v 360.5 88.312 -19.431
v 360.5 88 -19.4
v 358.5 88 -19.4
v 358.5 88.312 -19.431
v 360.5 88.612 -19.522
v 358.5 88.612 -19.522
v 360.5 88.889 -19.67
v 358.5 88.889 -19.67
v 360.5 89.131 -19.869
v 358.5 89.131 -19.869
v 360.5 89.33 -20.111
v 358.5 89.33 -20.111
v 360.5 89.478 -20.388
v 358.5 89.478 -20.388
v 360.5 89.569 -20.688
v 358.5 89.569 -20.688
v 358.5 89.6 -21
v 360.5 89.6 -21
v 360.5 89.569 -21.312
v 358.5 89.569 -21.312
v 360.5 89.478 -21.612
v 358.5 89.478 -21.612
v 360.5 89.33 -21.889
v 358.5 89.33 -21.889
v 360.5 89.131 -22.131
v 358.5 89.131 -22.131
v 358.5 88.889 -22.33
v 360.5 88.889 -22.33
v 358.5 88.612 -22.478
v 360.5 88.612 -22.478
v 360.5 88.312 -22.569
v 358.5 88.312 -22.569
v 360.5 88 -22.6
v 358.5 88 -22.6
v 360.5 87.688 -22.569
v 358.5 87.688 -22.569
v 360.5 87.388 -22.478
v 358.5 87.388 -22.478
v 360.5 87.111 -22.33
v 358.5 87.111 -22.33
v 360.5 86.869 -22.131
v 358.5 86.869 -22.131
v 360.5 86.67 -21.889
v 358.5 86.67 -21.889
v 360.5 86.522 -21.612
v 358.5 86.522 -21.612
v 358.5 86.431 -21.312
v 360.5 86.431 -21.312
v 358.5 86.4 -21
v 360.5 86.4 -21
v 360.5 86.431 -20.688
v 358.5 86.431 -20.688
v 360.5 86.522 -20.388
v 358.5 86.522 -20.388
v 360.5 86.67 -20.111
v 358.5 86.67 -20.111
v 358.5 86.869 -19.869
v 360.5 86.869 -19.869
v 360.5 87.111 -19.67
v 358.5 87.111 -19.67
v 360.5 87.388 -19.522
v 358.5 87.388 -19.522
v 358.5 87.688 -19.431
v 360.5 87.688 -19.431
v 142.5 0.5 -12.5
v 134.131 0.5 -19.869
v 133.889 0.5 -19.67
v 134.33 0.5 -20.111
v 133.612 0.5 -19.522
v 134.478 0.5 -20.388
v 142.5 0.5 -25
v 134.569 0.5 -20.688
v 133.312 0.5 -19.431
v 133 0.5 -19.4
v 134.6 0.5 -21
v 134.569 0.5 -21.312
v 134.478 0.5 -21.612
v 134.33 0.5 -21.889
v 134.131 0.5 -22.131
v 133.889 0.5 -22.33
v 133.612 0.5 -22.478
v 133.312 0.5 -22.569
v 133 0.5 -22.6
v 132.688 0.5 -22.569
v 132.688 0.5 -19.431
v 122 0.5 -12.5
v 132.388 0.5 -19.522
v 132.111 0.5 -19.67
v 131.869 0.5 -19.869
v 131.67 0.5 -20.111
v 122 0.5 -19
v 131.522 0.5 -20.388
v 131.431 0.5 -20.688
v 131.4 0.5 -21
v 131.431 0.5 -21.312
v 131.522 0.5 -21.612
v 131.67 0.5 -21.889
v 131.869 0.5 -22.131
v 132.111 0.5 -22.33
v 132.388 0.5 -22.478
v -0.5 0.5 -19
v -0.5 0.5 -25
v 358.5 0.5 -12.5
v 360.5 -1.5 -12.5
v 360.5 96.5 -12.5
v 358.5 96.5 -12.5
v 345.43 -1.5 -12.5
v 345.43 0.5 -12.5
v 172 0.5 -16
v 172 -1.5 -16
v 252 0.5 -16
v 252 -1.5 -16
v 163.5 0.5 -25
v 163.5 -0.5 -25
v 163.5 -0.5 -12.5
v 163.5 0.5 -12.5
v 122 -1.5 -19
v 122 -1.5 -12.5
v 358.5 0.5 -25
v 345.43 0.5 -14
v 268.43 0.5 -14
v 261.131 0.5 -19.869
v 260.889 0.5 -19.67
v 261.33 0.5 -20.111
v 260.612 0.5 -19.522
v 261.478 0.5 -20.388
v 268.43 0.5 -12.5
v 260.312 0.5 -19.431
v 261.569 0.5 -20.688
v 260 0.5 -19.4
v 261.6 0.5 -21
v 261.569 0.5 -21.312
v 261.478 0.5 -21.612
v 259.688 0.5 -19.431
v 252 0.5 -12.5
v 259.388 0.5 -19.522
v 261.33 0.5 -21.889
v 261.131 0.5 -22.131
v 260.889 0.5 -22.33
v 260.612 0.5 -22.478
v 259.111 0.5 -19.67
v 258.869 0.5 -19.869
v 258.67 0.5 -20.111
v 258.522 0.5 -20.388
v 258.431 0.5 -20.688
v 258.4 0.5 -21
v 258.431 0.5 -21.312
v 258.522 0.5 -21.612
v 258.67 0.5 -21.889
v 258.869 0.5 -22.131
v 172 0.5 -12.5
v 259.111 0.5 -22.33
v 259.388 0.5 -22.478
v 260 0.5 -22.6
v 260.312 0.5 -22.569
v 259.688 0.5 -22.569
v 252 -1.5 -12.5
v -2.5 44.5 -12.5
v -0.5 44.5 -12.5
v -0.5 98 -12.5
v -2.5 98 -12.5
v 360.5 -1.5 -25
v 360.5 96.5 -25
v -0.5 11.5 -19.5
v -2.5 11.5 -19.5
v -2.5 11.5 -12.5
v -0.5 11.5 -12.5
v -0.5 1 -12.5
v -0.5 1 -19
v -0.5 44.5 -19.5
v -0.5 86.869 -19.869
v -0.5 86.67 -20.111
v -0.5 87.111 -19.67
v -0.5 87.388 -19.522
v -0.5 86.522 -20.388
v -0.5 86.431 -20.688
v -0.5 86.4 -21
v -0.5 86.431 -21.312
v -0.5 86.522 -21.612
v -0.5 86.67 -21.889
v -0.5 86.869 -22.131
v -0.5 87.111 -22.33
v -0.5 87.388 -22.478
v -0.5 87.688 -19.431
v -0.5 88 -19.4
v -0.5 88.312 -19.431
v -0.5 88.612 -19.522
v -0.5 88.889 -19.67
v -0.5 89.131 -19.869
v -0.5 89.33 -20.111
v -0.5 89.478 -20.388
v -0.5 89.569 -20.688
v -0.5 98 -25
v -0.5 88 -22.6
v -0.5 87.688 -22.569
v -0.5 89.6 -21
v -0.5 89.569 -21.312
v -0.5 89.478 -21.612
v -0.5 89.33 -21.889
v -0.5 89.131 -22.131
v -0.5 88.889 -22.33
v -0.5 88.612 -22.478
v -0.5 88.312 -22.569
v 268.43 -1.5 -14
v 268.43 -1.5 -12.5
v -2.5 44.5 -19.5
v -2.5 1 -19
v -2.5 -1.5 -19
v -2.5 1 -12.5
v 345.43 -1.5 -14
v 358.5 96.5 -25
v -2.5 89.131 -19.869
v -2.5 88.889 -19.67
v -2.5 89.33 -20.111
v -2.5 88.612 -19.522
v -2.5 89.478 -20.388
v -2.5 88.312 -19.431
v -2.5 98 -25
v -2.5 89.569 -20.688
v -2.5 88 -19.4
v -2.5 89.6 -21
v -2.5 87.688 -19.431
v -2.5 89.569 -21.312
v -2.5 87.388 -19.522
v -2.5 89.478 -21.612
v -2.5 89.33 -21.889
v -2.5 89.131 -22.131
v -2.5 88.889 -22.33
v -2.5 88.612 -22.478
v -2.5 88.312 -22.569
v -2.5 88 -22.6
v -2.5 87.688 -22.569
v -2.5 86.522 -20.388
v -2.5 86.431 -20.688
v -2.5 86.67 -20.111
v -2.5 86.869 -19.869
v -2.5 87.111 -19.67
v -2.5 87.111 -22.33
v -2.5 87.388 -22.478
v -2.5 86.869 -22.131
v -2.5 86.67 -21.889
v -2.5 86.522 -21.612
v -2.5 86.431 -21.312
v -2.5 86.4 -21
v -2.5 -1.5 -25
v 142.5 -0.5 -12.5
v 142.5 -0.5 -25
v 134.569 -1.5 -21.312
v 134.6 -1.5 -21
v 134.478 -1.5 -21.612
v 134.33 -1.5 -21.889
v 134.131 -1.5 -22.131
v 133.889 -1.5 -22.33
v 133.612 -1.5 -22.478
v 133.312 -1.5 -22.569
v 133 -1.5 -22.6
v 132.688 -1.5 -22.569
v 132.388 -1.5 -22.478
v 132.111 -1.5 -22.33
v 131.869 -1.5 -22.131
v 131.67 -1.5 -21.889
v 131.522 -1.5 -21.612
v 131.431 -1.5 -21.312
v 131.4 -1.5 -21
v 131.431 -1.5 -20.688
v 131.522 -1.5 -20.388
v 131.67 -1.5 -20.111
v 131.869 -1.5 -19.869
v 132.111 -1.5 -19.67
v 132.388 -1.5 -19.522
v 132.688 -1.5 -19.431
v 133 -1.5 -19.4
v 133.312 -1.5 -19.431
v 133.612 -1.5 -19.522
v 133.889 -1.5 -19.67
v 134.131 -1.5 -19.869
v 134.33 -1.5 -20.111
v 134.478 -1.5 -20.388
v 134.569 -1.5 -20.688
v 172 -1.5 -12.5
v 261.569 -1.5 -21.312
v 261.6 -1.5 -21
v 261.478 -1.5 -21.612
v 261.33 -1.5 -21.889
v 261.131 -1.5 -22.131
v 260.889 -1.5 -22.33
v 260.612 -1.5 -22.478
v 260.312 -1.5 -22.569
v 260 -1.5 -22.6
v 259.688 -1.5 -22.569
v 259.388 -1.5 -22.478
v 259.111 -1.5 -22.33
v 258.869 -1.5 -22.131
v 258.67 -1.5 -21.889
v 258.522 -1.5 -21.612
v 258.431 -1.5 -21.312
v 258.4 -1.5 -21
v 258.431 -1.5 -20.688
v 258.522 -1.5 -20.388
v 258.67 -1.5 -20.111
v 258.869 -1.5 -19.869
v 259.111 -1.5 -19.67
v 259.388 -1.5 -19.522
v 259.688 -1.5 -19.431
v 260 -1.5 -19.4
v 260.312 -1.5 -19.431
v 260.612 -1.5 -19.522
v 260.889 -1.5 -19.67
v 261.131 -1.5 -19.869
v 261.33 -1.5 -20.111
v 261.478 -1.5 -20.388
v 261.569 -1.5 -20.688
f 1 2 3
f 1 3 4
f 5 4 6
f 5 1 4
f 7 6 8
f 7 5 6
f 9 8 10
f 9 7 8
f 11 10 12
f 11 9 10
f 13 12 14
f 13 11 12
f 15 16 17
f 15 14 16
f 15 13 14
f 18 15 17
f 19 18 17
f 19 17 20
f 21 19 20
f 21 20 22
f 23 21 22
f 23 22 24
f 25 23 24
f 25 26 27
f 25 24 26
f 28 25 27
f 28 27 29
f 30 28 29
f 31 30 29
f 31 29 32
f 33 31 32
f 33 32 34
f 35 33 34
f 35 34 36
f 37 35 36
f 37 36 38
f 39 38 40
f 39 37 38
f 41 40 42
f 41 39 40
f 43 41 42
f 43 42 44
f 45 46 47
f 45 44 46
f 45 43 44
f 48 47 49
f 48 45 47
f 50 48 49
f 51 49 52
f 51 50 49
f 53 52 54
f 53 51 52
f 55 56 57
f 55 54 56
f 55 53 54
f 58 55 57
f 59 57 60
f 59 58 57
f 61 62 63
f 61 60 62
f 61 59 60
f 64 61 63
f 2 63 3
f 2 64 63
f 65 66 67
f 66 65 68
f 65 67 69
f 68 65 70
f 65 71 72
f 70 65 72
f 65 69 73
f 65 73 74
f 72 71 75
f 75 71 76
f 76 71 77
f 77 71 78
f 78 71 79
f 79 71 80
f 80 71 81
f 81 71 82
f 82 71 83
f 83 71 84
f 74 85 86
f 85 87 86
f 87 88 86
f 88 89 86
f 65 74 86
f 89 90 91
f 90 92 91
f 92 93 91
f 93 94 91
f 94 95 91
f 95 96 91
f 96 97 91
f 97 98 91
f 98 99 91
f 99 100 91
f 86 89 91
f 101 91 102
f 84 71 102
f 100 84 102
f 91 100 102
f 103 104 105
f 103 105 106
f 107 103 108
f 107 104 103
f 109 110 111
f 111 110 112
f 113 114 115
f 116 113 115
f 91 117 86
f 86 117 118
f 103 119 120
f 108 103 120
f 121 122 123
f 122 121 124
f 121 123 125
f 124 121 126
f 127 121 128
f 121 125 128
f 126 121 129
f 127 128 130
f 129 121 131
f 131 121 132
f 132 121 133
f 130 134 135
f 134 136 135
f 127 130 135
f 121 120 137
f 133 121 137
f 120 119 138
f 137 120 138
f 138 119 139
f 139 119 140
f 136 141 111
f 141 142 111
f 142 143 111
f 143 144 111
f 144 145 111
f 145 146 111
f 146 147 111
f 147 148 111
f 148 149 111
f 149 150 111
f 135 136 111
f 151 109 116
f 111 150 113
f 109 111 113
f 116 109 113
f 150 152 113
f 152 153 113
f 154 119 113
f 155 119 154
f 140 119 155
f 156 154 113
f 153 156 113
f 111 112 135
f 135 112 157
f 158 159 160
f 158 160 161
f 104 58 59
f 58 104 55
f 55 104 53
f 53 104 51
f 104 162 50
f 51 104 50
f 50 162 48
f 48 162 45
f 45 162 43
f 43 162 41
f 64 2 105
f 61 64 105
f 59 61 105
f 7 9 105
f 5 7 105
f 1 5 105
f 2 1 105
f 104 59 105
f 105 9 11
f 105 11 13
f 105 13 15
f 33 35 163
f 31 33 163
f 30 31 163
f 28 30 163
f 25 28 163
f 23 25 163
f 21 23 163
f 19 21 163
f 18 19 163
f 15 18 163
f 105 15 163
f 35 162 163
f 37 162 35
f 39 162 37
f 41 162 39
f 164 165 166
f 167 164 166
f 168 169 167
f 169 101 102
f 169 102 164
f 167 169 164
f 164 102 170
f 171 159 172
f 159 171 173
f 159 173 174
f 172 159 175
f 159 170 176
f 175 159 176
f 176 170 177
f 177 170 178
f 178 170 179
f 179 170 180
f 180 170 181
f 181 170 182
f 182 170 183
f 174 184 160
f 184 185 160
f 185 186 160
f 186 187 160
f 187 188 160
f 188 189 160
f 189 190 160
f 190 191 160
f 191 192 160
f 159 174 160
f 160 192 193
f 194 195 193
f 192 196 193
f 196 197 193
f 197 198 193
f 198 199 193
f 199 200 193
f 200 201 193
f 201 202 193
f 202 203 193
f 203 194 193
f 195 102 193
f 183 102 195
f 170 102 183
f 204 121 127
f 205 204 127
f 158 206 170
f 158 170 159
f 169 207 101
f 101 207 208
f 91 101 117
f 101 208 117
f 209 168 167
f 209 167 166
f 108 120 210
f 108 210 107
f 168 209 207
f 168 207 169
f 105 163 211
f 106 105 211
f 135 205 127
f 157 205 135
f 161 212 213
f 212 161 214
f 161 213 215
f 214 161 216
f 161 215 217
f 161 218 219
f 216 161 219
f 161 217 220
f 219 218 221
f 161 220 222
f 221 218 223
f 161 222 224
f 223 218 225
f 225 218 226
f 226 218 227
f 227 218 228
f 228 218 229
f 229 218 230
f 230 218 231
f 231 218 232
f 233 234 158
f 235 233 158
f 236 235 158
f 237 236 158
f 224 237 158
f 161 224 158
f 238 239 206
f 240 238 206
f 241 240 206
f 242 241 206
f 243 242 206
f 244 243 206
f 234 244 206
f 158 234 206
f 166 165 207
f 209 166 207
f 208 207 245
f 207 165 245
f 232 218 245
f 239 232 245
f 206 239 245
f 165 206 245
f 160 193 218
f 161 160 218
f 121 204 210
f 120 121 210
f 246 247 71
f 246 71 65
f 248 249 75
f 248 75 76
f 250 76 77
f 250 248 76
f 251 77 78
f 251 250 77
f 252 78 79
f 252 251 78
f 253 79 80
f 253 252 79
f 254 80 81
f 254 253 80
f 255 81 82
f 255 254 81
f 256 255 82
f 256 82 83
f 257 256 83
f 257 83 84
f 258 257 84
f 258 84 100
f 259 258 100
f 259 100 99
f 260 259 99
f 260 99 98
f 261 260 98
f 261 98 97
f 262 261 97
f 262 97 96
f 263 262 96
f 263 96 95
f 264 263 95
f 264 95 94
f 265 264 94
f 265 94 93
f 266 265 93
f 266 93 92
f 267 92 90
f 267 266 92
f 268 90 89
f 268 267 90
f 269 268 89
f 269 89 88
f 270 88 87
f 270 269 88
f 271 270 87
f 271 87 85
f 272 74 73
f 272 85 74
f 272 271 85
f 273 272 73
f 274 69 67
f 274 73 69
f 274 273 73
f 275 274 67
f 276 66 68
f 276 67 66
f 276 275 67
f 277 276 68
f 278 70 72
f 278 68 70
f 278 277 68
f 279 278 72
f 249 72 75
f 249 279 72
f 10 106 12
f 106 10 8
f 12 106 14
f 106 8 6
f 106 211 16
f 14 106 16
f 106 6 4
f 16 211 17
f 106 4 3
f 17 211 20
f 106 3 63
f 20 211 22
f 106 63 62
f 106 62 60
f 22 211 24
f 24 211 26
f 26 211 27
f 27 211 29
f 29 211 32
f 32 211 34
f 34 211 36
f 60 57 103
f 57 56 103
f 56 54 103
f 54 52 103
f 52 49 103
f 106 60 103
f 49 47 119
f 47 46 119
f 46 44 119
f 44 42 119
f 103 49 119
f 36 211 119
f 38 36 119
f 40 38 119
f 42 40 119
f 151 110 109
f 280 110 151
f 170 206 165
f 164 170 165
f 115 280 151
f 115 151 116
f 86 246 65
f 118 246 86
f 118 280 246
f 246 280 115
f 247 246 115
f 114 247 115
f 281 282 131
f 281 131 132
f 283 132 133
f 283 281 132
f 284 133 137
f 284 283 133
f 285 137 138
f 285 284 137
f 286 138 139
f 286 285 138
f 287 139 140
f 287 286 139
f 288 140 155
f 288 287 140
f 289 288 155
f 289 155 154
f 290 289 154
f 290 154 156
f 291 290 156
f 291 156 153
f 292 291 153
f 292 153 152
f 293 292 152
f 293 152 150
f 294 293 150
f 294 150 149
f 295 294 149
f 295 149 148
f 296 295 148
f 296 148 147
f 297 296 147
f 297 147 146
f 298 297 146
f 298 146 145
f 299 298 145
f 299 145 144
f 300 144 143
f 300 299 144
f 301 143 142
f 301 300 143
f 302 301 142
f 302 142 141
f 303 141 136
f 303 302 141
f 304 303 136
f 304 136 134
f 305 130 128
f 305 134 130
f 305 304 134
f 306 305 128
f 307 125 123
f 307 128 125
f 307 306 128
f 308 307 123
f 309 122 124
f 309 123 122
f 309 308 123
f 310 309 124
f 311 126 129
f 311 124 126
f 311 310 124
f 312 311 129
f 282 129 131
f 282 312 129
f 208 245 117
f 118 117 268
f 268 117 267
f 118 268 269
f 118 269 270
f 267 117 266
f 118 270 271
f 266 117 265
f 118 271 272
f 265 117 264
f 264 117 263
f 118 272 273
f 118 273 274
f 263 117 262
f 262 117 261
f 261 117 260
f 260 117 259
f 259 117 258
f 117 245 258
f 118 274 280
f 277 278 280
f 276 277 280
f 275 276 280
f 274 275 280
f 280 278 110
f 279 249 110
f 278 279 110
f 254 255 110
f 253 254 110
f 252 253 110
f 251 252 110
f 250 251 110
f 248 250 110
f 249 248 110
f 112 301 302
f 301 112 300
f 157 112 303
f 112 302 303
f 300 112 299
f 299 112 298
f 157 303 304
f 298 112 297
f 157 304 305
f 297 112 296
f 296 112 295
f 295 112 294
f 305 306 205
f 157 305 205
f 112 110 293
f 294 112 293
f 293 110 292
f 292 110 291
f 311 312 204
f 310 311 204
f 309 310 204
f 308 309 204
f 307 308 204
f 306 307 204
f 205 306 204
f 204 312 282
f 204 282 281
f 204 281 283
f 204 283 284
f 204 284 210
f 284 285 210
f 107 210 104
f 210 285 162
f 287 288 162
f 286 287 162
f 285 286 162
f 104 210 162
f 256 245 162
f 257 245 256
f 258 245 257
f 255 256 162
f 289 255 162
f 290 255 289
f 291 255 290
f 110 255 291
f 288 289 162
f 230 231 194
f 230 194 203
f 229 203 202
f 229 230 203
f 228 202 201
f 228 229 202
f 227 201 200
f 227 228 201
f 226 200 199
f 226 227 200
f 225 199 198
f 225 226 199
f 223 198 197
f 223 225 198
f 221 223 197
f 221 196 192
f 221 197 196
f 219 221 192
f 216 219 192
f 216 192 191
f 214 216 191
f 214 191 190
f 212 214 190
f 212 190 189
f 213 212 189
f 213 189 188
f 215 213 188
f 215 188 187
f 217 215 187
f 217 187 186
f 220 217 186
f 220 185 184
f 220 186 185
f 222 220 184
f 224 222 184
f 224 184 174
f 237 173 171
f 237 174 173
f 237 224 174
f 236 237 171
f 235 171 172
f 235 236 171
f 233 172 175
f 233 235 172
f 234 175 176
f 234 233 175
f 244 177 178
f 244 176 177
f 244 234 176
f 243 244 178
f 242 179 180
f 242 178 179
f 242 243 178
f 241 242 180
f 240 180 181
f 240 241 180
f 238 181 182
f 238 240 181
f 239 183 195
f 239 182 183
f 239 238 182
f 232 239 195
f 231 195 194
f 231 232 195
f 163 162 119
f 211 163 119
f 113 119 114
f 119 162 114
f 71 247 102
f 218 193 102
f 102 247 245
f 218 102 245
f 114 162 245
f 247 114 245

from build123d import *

# Parameters (mm, degrees)
SKETCH103_W             = 21
SKETCH103_H             = 19
EXTRUDE095_DEPTH        = 2
SKETCH127_R             = 1.6
EXTRUDE117_DEPTH        = 10
BODY090_PLACEMENT_ANGLE = 90
BODY091_PLACEMENT_ANGLE = 90
BODY092_PLACEMENT_ANGLE = 90
BODY093_PLACEMENT_ANGLE = 90
SKETCH135_W             = 33
SKETCH135_H             = 7.5
EXTRUDE125_DEPTH        = 4
SKETCH102_W             = 126
SKETCH102_H             = 18
SKETCH102_W_2           = 80
SKETCH102_H_2           = 14
SKETCH102_W_3           = 77
SKETCH102_H_3           = 12
EXTRUDE094_DEPTH        = 4
EXTRUDE077_DEPTH        = 12.5


with BuildPart() as extrude095:
    # Sketch103 → Extrude095 (new body)
    with BuildSketch(Plane.XZ.offset(0.5)):
        with Locations((153, -16.5)):
            Rectangle(SKETCH103_W, SKETCH103_H)
    extrude(amount=-EXTRUDE095_DEPTH)


with BuildPart() as screw_outer:
    # Sketch127 → Extrude117 (new body)
    with BuildSketch(Plane.XY):
        Circle(SKETCH127_R)
    extrude(amount=EXTRUDE117_DEPTH)


with BuildPart() as screw_outer011:
    # Body090 base: copy of screw outer
    add(screw_outer.part)


with BuildPart() as screw_outer011_1:
    # Body090 placement: moved
    add(screw_outer011.part.moved(Location((-3.5, 88, -21))).rotate(Axis((-3.5, 88, -21), (0, 1, 0)), BODY090_PLACEMENT_ANGLE))


with BuildPart() as screw_outer012:
    # Body091 base: copy of screw outer
    add(screw_outer.part)


with BuildPart() as screw_outer012_1:
    # Body091 placement: moved
    add(screw_outer012.part.moved(Location((361.5, 88, -21))).rotate(Axis((361.5, 88, -21), (0, -1, 0)), BODY091_PLACEMENT_ANGLE))


with BuildPart() as screw_outer013:
    # Body092 base: copy of screw outer
    add(screw_outer.part)


with BuildPart() as screw_outer013_1:
    # Body092 placement: moved
    add(screw_outer013.part.moved(Location((133, -2.5, -21))).rotate(Axis((133, -2.5, -21), (-1, 0, 0)), BODY092_PLACEMENT_ANGLE))


with BuildPart() as screw_outer014:
    # Body093 base: copy of screw outer
    add(screw_outer.part)


with BuildPart() as screw_outer014_1:
    # Body093 placement: moved
    add(screw_outer014.part.moved(Location((260, -2.5, -21))).rotate(Axis((260, -2.5, -21), (-1, 0, 0)), BODY093_PLACEMENT_ANGLE))


with BuildPart() as power_cover001:
    # Sketch135 → Extrude125 (new body)
    with BuildSketch(Plane(origin=(-3.5, 0, 0), x_dir=(0, -1, 0), z_dir=(-1, 0, 0))):
        with Locations((-28, -15.75)):
            Rectangle(SKETCH135_W, SKETCH135_H)
    extrude(amount=-EXTRUDE125_DEPTH)


with BuildPart() as compound021:
    # Sketch102 → Extrude094 (new body)
    with BuildSketch(Plane.XZ.offset(3)):
        with Locations((59, -10)):
            Rectangle(SKETCH102_W, SKETCH102_H)
        with Locations((212, -9)):
            Rectangle(SKETCH102_W_2, SKETCH102_H_2)
        with Locations((306.93, -8)):
            Rectangle(SKETCH102_W_3, SKETCH102_H_3)
    extrude(amount=-EXTRUDE094_DEPTH)

    # Compound021: union Extrude095, screw outer011, screw outer012, screw outer013, screw outer014, power cover001
    add(extrude095.part)
    add(screw_outer011_1.part)
    add(screw_outer012_1.part)
    add(screw_outer013_1.part)
    add(screw_outer014_1.part)
    add(power_cover001.part)


with BuildPart() as side001:
    # Sketch085 → Extrude077 (new body)
    with BuildSketch(Plane(origin=(0, 0, -25), x_dir=(1, 0, 0), z_dir=(0, 0, -1))):
        Polygon((-2.5, 1.5), (360.5, 1.5), (360.5, -96.5), (358.5, -96.5), (358.5, -0.5), (-0.5, -0.5), (-0.5, -98), (-2.5, -98), align=None)
    extrude(amount=-EXTRUDE077_DEPTH)

    # Cut011: cut Compound021
    add(compound021.part, mode=Mode.SUBTRACT)


solid = side001.part
